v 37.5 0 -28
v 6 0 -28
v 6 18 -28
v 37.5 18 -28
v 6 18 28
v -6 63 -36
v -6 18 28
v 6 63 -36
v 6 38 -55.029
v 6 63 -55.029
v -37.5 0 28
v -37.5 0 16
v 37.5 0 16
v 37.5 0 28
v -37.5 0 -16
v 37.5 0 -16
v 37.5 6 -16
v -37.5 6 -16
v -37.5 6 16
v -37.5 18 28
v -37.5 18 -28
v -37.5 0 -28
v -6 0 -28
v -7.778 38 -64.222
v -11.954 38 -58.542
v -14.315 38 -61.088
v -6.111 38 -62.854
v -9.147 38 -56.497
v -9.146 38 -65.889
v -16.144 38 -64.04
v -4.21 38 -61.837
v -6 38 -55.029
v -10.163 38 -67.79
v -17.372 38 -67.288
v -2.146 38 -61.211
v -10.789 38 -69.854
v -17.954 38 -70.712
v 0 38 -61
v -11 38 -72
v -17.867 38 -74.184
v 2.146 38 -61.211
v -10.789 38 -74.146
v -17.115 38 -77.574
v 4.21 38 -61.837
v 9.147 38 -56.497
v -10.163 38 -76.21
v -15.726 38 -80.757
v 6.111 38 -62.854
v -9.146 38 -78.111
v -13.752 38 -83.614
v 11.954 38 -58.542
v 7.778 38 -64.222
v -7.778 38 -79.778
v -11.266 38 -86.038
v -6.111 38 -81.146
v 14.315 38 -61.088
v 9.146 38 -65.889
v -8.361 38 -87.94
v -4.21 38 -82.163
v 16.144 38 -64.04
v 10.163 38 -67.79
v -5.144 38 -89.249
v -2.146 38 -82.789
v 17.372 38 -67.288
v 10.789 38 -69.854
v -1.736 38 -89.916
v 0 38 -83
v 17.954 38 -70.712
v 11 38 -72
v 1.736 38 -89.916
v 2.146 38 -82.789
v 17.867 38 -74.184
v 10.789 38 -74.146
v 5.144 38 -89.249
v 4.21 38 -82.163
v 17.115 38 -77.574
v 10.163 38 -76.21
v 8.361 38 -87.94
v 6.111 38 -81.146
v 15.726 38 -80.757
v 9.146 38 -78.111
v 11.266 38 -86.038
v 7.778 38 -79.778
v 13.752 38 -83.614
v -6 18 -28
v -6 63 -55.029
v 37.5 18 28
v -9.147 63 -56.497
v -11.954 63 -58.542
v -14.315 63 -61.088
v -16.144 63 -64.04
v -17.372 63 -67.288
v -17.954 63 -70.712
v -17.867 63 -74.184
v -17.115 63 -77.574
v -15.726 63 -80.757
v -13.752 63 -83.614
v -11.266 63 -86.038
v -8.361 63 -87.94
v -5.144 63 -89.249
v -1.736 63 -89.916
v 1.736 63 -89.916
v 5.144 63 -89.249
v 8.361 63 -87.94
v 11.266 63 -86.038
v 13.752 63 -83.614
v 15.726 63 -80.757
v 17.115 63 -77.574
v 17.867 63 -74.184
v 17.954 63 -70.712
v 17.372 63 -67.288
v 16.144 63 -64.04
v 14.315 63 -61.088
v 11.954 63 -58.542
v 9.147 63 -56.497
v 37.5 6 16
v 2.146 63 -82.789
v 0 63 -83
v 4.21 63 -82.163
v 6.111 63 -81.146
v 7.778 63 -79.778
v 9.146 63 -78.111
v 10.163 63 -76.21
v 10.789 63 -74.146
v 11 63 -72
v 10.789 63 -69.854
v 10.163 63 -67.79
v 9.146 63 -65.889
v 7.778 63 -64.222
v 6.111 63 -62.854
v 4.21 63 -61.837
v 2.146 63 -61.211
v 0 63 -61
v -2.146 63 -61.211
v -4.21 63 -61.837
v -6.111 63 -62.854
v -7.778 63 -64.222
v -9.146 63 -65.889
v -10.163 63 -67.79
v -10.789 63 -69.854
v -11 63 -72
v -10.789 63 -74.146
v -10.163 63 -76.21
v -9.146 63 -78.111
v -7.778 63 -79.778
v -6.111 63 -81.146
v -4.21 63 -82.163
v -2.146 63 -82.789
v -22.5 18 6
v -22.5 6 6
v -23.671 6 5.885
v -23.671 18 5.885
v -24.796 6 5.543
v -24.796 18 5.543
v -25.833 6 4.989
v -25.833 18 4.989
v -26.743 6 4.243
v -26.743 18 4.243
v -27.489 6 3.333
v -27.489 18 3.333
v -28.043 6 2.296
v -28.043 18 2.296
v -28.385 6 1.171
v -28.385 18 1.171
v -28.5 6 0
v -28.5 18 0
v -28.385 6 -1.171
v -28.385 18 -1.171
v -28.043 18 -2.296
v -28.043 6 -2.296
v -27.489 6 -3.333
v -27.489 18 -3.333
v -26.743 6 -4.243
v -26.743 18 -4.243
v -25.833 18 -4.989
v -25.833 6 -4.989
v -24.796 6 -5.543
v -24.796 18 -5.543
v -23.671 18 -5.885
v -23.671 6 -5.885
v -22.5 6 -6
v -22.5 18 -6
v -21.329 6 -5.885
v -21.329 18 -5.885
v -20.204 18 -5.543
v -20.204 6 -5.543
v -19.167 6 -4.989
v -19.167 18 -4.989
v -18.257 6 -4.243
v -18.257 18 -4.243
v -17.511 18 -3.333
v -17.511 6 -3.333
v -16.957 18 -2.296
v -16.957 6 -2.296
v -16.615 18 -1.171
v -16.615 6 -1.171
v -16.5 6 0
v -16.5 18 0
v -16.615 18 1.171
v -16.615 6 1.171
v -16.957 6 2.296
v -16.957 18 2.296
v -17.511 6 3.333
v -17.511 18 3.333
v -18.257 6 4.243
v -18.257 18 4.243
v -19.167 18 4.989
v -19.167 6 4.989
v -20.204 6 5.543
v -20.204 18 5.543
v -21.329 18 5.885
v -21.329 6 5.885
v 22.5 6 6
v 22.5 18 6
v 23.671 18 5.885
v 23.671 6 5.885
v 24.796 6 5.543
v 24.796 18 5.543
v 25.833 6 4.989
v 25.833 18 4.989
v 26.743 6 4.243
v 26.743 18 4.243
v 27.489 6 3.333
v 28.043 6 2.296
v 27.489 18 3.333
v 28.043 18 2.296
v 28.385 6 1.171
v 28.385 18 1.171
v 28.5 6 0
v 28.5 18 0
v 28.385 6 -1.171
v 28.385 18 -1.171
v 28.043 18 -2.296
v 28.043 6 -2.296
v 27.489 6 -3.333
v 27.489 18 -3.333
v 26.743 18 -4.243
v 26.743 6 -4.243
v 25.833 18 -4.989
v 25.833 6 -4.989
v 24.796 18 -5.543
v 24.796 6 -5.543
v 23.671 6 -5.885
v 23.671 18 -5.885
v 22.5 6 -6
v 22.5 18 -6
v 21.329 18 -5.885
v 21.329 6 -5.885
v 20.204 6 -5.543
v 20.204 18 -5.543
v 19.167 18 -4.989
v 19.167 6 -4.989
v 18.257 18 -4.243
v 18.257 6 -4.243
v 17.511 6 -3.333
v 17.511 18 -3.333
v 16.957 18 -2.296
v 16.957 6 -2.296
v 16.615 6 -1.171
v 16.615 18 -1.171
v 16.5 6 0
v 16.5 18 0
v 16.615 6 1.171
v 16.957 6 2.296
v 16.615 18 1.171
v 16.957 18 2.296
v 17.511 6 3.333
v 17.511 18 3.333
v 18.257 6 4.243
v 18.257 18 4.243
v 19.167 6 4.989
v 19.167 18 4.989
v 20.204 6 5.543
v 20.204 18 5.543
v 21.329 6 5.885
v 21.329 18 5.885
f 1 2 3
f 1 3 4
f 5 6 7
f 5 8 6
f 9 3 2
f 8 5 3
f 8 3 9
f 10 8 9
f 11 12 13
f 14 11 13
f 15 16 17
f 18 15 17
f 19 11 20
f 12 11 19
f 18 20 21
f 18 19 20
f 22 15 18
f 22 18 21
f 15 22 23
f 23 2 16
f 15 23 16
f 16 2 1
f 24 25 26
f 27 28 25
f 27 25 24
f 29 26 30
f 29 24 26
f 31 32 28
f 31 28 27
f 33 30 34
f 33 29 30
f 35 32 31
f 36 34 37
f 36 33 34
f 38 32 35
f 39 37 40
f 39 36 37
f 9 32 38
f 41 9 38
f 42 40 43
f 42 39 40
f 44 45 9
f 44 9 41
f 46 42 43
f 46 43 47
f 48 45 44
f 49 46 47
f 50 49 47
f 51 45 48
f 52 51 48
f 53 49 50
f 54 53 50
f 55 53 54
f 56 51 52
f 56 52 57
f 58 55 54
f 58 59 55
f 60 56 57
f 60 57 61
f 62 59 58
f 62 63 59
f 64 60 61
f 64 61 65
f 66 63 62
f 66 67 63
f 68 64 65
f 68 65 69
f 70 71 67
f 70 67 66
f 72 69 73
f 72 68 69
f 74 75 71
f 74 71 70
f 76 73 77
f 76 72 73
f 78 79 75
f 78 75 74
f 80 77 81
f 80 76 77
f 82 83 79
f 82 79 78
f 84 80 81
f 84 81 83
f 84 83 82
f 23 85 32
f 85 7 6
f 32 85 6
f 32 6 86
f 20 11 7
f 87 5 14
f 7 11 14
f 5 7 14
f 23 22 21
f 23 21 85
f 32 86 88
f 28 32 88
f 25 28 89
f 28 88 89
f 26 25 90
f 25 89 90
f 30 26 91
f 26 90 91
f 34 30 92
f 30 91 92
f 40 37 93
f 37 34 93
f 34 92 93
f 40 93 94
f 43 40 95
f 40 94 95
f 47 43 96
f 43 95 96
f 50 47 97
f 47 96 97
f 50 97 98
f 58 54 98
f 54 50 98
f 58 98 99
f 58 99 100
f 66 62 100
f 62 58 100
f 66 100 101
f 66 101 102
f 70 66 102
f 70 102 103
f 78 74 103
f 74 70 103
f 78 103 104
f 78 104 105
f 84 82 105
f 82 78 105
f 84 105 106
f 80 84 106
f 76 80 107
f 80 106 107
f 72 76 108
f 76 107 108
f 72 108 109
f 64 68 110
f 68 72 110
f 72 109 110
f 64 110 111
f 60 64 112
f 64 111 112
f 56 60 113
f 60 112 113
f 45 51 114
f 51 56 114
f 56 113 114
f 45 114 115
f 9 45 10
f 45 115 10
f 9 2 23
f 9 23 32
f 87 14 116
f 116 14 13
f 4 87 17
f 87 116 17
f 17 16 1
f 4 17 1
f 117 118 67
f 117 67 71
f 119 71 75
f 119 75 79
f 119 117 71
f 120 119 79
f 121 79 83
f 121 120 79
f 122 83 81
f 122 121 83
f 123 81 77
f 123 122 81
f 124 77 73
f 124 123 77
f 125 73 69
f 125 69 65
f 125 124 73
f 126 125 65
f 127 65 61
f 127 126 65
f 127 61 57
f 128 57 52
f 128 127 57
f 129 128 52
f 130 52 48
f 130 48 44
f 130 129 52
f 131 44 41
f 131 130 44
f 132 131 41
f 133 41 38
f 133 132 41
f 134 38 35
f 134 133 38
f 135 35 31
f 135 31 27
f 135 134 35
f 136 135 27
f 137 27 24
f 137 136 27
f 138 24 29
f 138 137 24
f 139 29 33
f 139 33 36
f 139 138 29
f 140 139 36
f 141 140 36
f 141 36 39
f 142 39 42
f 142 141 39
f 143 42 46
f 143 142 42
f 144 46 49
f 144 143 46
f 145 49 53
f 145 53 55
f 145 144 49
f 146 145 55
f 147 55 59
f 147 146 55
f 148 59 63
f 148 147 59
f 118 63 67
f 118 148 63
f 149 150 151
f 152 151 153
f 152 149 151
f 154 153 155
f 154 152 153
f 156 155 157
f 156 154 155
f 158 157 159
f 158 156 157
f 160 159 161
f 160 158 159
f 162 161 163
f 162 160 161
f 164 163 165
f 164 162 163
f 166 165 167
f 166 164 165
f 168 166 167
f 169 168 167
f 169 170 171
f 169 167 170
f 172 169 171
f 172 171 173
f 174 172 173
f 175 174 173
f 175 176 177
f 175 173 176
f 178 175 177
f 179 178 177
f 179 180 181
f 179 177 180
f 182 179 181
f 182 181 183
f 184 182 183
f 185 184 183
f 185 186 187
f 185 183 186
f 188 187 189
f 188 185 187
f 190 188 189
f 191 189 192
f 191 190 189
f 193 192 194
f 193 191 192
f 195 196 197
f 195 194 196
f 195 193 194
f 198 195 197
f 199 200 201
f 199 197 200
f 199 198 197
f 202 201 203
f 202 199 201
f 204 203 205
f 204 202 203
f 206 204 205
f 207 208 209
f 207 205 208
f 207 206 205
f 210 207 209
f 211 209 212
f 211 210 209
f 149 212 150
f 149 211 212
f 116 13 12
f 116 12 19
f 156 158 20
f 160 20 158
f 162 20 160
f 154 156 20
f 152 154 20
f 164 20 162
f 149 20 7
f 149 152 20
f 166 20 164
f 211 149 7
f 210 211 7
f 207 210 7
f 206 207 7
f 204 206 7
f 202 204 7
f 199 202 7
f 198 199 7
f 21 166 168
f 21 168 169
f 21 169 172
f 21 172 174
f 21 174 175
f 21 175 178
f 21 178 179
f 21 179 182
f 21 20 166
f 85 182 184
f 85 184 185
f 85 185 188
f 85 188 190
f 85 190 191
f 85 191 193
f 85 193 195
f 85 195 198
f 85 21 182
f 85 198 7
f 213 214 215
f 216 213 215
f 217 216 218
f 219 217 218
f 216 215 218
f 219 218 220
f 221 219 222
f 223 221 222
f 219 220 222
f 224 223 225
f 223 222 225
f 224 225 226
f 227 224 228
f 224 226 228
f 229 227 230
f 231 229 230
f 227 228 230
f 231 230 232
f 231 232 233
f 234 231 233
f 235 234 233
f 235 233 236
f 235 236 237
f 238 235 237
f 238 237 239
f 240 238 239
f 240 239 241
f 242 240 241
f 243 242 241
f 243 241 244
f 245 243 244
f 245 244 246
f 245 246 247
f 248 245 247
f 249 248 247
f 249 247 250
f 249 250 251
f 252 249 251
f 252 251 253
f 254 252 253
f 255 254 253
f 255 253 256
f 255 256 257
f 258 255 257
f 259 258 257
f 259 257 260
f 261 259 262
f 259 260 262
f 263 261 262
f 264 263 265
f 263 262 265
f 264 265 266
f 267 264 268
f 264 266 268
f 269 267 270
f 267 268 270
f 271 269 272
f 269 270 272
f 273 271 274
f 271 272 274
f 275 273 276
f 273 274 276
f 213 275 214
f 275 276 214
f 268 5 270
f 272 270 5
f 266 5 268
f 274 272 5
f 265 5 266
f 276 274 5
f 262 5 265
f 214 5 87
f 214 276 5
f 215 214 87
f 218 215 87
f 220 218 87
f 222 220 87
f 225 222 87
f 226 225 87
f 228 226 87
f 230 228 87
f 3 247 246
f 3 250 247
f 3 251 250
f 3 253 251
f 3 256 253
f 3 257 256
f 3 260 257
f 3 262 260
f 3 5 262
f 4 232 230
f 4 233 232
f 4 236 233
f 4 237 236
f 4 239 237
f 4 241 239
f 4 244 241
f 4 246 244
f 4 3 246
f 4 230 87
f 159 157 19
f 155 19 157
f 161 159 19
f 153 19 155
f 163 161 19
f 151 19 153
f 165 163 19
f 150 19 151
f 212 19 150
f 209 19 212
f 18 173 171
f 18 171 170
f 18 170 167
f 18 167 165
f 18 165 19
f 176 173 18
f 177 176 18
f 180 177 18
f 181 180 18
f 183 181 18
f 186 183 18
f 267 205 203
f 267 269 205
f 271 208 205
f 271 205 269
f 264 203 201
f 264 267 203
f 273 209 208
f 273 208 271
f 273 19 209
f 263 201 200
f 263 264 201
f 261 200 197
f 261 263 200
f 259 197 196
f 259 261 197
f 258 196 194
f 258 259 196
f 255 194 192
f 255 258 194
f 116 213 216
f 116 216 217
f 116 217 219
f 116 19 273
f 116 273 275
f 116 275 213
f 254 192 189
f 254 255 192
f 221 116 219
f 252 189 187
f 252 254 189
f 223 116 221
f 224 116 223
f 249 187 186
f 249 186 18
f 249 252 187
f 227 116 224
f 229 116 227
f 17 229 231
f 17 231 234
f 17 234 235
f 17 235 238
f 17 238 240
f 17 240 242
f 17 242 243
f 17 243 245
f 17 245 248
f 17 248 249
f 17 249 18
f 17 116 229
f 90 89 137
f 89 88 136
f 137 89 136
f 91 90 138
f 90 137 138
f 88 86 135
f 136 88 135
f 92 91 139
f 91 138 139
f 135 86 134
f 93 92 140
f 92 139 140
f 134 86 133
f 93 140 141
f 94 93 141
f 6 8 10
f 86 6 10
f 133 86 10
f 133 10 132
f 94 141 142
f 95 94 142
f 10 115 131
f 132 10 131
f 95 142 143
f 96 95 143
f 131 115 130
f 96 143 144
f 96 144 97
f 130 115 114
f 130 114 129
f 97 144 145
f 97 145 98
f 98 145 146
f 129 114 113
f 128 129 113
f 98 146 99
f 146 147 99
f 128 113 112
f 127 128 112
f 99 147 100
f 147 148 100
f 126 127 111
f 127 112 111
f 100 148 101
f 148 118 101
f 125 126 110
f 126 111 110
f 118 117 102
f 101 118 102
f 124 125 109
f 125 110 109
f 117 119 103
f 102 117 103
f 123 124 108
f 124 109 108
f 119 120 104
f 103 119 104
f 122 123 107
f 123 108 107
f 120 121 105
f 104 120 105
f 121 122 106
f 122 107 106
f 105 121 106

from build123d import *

# Parameters (mm, degrees)
ESQUISSE4_W             = 75
ESQUISSE4_H             = 56
BOSS_EXTRU_2_DEPTH      = 18
ESQUISSE5_R             = 6
ENL_V_MAT_EXTRU_3_DEPTH = 51.142297514
ESQUISSE6_W             = 32
ESQUISSE6_H             = 6
ENL_V_MAT_EXTRU_4_DEPTH = 83.054859698
ESQUISSE9_R             = 18
ESQUISSE9_R_2           = 11
BOSS_EXTRU_3_DEPTH      = 25
BOSS_EXTRU_6_REACH      = 99.32
BOSS_EXTRU_6_END_RADIUS = 18
ESQUISSE10_W            = 12
ESQUISSE10_H            = 25
BOSS_EXTRU_7_DEPTH      = 6


with BuildPart() as part:
    # Esquisse4 → Boss.-Extru.2 (new body)
    with BuildSketch(Plane(origin=(0, 0, 0), x_dir=(1, 0, 0), z_dir=(0, 1, 0))):
        Rectangle(ESQUISSE4_W, ESQUISSE4_H)
    extrude(amount=BOSS_EXTRU_2_DEPTH)

    # Esquisse5 → Enlèv. mat.-Extru.3 (cut, through all)
    with BuildSketch(Plane(origin=(0, 18, 0), x_dir=(1, 0, 0), z_dir=(0, 1, 0))):
        with Locations(Location((22.5, 0, 0), (0, 0, 270))):
            Circle(ESQUISSE5_R)
    enl_v_mat_extru_3 = extrude(amount=-ENL_V_MAT_EXTRU_3_DEPTH, mode=Mode.SUBTRACT)

    # Symétrie1: Enlèv. mat.-Extru.3 across plane
    add(enl_v_mat_extru_3.mirror(Plane(origin=(0, 0, 0), x_dir=(0, 0, 1), z_dir=(1, 0, 0))), mode=Mode.SUBTRACT)

    # Esquisse6 → Enlèv. mat.-Extru.4 (cut, through all)
    with BuildSketch(Plane(origin=(37.5, 0, 0), x_dir=(0, 0, -1), z_dir=(1, 0, 0))):
        with Locations((0, 3)):
            Rectangle(ESQUISSE6_W, ESQUISSE6_H)
    extrude(amount=-ENL_V_MAT_EXTRU_4_DEPTH, mode=Mode.SUBTRACT)



with BuildPart() as body_2:
    # Esquisse9 → Boss.-Extru.3 (new body)
    with BuildSketch(Plane(origin=(0, 63, 0), x_dir=(-1, 0, 0), z_dir=(0, -1, 0))):
        with Locations(Location((0, 72, 0), (0, 0, 90))):
            Circle(ESQUISSE9_R)
        with Locations(Location((0, 72, 0), (0, 0, 90))):
            Circle(ESQUISSE9_R_2, mode=Mode.SUBTRACT)
    extrude(amount=BOSS_EXTRU_3_DEPTH)

    # Boss.-Extru.6: up to this cylinder (the profile starts outside it)
    boss_extru_6_end = Plane(origin=(0, 50.5, -72), z_dir=(0, 1, 0)) * Cylinder(BOSS_EXTRU_6_END_RADIUS, 235.64, mode=Mode.PRIVATE)
    # Esquisse10 → Boss.-Extru.6 (add, up to the surface)
    with BuildSketch(Plane.XY.offset(-36), mode=Mode.PRIVATE) as boss_extru_6_sk1:
        with Locations((0, 50.5)):
            Rectangle(ESQUISSE10_W, ESQUISSE10_H)
    boss_extru_6_tool1 = extrude(boss_extru_6_sk1.sketch, amount=-BOSS_EXTRU_6_REACH, mode=Mode.PRIVATE) - boss_extru_6_end
    add(boss_extru_6_tool1.solids().sort_by_distance((0, 50.5, -36))[0])


with BuildPart() as part_1:
    add(part.part)

    add(body_2.part)  # Boss.-Extru.7 merges body 2
    # Esquisse11 → Boss.-Extru.7 (add, symmetric)
    with BuildSketch(Plane(origin=(0, 0, 0), x_dir=(0, 0, -1), z_dir=(1, 0, 0))):
        Polygon((36, 63), (-28, 18), (28, 18), (28, 0), (55.029437252, 38), (36, 38), align=None)
    extrude(amount=BOSS_EXTRU_7_DEPTH, both=True)


solid = part_1.part
